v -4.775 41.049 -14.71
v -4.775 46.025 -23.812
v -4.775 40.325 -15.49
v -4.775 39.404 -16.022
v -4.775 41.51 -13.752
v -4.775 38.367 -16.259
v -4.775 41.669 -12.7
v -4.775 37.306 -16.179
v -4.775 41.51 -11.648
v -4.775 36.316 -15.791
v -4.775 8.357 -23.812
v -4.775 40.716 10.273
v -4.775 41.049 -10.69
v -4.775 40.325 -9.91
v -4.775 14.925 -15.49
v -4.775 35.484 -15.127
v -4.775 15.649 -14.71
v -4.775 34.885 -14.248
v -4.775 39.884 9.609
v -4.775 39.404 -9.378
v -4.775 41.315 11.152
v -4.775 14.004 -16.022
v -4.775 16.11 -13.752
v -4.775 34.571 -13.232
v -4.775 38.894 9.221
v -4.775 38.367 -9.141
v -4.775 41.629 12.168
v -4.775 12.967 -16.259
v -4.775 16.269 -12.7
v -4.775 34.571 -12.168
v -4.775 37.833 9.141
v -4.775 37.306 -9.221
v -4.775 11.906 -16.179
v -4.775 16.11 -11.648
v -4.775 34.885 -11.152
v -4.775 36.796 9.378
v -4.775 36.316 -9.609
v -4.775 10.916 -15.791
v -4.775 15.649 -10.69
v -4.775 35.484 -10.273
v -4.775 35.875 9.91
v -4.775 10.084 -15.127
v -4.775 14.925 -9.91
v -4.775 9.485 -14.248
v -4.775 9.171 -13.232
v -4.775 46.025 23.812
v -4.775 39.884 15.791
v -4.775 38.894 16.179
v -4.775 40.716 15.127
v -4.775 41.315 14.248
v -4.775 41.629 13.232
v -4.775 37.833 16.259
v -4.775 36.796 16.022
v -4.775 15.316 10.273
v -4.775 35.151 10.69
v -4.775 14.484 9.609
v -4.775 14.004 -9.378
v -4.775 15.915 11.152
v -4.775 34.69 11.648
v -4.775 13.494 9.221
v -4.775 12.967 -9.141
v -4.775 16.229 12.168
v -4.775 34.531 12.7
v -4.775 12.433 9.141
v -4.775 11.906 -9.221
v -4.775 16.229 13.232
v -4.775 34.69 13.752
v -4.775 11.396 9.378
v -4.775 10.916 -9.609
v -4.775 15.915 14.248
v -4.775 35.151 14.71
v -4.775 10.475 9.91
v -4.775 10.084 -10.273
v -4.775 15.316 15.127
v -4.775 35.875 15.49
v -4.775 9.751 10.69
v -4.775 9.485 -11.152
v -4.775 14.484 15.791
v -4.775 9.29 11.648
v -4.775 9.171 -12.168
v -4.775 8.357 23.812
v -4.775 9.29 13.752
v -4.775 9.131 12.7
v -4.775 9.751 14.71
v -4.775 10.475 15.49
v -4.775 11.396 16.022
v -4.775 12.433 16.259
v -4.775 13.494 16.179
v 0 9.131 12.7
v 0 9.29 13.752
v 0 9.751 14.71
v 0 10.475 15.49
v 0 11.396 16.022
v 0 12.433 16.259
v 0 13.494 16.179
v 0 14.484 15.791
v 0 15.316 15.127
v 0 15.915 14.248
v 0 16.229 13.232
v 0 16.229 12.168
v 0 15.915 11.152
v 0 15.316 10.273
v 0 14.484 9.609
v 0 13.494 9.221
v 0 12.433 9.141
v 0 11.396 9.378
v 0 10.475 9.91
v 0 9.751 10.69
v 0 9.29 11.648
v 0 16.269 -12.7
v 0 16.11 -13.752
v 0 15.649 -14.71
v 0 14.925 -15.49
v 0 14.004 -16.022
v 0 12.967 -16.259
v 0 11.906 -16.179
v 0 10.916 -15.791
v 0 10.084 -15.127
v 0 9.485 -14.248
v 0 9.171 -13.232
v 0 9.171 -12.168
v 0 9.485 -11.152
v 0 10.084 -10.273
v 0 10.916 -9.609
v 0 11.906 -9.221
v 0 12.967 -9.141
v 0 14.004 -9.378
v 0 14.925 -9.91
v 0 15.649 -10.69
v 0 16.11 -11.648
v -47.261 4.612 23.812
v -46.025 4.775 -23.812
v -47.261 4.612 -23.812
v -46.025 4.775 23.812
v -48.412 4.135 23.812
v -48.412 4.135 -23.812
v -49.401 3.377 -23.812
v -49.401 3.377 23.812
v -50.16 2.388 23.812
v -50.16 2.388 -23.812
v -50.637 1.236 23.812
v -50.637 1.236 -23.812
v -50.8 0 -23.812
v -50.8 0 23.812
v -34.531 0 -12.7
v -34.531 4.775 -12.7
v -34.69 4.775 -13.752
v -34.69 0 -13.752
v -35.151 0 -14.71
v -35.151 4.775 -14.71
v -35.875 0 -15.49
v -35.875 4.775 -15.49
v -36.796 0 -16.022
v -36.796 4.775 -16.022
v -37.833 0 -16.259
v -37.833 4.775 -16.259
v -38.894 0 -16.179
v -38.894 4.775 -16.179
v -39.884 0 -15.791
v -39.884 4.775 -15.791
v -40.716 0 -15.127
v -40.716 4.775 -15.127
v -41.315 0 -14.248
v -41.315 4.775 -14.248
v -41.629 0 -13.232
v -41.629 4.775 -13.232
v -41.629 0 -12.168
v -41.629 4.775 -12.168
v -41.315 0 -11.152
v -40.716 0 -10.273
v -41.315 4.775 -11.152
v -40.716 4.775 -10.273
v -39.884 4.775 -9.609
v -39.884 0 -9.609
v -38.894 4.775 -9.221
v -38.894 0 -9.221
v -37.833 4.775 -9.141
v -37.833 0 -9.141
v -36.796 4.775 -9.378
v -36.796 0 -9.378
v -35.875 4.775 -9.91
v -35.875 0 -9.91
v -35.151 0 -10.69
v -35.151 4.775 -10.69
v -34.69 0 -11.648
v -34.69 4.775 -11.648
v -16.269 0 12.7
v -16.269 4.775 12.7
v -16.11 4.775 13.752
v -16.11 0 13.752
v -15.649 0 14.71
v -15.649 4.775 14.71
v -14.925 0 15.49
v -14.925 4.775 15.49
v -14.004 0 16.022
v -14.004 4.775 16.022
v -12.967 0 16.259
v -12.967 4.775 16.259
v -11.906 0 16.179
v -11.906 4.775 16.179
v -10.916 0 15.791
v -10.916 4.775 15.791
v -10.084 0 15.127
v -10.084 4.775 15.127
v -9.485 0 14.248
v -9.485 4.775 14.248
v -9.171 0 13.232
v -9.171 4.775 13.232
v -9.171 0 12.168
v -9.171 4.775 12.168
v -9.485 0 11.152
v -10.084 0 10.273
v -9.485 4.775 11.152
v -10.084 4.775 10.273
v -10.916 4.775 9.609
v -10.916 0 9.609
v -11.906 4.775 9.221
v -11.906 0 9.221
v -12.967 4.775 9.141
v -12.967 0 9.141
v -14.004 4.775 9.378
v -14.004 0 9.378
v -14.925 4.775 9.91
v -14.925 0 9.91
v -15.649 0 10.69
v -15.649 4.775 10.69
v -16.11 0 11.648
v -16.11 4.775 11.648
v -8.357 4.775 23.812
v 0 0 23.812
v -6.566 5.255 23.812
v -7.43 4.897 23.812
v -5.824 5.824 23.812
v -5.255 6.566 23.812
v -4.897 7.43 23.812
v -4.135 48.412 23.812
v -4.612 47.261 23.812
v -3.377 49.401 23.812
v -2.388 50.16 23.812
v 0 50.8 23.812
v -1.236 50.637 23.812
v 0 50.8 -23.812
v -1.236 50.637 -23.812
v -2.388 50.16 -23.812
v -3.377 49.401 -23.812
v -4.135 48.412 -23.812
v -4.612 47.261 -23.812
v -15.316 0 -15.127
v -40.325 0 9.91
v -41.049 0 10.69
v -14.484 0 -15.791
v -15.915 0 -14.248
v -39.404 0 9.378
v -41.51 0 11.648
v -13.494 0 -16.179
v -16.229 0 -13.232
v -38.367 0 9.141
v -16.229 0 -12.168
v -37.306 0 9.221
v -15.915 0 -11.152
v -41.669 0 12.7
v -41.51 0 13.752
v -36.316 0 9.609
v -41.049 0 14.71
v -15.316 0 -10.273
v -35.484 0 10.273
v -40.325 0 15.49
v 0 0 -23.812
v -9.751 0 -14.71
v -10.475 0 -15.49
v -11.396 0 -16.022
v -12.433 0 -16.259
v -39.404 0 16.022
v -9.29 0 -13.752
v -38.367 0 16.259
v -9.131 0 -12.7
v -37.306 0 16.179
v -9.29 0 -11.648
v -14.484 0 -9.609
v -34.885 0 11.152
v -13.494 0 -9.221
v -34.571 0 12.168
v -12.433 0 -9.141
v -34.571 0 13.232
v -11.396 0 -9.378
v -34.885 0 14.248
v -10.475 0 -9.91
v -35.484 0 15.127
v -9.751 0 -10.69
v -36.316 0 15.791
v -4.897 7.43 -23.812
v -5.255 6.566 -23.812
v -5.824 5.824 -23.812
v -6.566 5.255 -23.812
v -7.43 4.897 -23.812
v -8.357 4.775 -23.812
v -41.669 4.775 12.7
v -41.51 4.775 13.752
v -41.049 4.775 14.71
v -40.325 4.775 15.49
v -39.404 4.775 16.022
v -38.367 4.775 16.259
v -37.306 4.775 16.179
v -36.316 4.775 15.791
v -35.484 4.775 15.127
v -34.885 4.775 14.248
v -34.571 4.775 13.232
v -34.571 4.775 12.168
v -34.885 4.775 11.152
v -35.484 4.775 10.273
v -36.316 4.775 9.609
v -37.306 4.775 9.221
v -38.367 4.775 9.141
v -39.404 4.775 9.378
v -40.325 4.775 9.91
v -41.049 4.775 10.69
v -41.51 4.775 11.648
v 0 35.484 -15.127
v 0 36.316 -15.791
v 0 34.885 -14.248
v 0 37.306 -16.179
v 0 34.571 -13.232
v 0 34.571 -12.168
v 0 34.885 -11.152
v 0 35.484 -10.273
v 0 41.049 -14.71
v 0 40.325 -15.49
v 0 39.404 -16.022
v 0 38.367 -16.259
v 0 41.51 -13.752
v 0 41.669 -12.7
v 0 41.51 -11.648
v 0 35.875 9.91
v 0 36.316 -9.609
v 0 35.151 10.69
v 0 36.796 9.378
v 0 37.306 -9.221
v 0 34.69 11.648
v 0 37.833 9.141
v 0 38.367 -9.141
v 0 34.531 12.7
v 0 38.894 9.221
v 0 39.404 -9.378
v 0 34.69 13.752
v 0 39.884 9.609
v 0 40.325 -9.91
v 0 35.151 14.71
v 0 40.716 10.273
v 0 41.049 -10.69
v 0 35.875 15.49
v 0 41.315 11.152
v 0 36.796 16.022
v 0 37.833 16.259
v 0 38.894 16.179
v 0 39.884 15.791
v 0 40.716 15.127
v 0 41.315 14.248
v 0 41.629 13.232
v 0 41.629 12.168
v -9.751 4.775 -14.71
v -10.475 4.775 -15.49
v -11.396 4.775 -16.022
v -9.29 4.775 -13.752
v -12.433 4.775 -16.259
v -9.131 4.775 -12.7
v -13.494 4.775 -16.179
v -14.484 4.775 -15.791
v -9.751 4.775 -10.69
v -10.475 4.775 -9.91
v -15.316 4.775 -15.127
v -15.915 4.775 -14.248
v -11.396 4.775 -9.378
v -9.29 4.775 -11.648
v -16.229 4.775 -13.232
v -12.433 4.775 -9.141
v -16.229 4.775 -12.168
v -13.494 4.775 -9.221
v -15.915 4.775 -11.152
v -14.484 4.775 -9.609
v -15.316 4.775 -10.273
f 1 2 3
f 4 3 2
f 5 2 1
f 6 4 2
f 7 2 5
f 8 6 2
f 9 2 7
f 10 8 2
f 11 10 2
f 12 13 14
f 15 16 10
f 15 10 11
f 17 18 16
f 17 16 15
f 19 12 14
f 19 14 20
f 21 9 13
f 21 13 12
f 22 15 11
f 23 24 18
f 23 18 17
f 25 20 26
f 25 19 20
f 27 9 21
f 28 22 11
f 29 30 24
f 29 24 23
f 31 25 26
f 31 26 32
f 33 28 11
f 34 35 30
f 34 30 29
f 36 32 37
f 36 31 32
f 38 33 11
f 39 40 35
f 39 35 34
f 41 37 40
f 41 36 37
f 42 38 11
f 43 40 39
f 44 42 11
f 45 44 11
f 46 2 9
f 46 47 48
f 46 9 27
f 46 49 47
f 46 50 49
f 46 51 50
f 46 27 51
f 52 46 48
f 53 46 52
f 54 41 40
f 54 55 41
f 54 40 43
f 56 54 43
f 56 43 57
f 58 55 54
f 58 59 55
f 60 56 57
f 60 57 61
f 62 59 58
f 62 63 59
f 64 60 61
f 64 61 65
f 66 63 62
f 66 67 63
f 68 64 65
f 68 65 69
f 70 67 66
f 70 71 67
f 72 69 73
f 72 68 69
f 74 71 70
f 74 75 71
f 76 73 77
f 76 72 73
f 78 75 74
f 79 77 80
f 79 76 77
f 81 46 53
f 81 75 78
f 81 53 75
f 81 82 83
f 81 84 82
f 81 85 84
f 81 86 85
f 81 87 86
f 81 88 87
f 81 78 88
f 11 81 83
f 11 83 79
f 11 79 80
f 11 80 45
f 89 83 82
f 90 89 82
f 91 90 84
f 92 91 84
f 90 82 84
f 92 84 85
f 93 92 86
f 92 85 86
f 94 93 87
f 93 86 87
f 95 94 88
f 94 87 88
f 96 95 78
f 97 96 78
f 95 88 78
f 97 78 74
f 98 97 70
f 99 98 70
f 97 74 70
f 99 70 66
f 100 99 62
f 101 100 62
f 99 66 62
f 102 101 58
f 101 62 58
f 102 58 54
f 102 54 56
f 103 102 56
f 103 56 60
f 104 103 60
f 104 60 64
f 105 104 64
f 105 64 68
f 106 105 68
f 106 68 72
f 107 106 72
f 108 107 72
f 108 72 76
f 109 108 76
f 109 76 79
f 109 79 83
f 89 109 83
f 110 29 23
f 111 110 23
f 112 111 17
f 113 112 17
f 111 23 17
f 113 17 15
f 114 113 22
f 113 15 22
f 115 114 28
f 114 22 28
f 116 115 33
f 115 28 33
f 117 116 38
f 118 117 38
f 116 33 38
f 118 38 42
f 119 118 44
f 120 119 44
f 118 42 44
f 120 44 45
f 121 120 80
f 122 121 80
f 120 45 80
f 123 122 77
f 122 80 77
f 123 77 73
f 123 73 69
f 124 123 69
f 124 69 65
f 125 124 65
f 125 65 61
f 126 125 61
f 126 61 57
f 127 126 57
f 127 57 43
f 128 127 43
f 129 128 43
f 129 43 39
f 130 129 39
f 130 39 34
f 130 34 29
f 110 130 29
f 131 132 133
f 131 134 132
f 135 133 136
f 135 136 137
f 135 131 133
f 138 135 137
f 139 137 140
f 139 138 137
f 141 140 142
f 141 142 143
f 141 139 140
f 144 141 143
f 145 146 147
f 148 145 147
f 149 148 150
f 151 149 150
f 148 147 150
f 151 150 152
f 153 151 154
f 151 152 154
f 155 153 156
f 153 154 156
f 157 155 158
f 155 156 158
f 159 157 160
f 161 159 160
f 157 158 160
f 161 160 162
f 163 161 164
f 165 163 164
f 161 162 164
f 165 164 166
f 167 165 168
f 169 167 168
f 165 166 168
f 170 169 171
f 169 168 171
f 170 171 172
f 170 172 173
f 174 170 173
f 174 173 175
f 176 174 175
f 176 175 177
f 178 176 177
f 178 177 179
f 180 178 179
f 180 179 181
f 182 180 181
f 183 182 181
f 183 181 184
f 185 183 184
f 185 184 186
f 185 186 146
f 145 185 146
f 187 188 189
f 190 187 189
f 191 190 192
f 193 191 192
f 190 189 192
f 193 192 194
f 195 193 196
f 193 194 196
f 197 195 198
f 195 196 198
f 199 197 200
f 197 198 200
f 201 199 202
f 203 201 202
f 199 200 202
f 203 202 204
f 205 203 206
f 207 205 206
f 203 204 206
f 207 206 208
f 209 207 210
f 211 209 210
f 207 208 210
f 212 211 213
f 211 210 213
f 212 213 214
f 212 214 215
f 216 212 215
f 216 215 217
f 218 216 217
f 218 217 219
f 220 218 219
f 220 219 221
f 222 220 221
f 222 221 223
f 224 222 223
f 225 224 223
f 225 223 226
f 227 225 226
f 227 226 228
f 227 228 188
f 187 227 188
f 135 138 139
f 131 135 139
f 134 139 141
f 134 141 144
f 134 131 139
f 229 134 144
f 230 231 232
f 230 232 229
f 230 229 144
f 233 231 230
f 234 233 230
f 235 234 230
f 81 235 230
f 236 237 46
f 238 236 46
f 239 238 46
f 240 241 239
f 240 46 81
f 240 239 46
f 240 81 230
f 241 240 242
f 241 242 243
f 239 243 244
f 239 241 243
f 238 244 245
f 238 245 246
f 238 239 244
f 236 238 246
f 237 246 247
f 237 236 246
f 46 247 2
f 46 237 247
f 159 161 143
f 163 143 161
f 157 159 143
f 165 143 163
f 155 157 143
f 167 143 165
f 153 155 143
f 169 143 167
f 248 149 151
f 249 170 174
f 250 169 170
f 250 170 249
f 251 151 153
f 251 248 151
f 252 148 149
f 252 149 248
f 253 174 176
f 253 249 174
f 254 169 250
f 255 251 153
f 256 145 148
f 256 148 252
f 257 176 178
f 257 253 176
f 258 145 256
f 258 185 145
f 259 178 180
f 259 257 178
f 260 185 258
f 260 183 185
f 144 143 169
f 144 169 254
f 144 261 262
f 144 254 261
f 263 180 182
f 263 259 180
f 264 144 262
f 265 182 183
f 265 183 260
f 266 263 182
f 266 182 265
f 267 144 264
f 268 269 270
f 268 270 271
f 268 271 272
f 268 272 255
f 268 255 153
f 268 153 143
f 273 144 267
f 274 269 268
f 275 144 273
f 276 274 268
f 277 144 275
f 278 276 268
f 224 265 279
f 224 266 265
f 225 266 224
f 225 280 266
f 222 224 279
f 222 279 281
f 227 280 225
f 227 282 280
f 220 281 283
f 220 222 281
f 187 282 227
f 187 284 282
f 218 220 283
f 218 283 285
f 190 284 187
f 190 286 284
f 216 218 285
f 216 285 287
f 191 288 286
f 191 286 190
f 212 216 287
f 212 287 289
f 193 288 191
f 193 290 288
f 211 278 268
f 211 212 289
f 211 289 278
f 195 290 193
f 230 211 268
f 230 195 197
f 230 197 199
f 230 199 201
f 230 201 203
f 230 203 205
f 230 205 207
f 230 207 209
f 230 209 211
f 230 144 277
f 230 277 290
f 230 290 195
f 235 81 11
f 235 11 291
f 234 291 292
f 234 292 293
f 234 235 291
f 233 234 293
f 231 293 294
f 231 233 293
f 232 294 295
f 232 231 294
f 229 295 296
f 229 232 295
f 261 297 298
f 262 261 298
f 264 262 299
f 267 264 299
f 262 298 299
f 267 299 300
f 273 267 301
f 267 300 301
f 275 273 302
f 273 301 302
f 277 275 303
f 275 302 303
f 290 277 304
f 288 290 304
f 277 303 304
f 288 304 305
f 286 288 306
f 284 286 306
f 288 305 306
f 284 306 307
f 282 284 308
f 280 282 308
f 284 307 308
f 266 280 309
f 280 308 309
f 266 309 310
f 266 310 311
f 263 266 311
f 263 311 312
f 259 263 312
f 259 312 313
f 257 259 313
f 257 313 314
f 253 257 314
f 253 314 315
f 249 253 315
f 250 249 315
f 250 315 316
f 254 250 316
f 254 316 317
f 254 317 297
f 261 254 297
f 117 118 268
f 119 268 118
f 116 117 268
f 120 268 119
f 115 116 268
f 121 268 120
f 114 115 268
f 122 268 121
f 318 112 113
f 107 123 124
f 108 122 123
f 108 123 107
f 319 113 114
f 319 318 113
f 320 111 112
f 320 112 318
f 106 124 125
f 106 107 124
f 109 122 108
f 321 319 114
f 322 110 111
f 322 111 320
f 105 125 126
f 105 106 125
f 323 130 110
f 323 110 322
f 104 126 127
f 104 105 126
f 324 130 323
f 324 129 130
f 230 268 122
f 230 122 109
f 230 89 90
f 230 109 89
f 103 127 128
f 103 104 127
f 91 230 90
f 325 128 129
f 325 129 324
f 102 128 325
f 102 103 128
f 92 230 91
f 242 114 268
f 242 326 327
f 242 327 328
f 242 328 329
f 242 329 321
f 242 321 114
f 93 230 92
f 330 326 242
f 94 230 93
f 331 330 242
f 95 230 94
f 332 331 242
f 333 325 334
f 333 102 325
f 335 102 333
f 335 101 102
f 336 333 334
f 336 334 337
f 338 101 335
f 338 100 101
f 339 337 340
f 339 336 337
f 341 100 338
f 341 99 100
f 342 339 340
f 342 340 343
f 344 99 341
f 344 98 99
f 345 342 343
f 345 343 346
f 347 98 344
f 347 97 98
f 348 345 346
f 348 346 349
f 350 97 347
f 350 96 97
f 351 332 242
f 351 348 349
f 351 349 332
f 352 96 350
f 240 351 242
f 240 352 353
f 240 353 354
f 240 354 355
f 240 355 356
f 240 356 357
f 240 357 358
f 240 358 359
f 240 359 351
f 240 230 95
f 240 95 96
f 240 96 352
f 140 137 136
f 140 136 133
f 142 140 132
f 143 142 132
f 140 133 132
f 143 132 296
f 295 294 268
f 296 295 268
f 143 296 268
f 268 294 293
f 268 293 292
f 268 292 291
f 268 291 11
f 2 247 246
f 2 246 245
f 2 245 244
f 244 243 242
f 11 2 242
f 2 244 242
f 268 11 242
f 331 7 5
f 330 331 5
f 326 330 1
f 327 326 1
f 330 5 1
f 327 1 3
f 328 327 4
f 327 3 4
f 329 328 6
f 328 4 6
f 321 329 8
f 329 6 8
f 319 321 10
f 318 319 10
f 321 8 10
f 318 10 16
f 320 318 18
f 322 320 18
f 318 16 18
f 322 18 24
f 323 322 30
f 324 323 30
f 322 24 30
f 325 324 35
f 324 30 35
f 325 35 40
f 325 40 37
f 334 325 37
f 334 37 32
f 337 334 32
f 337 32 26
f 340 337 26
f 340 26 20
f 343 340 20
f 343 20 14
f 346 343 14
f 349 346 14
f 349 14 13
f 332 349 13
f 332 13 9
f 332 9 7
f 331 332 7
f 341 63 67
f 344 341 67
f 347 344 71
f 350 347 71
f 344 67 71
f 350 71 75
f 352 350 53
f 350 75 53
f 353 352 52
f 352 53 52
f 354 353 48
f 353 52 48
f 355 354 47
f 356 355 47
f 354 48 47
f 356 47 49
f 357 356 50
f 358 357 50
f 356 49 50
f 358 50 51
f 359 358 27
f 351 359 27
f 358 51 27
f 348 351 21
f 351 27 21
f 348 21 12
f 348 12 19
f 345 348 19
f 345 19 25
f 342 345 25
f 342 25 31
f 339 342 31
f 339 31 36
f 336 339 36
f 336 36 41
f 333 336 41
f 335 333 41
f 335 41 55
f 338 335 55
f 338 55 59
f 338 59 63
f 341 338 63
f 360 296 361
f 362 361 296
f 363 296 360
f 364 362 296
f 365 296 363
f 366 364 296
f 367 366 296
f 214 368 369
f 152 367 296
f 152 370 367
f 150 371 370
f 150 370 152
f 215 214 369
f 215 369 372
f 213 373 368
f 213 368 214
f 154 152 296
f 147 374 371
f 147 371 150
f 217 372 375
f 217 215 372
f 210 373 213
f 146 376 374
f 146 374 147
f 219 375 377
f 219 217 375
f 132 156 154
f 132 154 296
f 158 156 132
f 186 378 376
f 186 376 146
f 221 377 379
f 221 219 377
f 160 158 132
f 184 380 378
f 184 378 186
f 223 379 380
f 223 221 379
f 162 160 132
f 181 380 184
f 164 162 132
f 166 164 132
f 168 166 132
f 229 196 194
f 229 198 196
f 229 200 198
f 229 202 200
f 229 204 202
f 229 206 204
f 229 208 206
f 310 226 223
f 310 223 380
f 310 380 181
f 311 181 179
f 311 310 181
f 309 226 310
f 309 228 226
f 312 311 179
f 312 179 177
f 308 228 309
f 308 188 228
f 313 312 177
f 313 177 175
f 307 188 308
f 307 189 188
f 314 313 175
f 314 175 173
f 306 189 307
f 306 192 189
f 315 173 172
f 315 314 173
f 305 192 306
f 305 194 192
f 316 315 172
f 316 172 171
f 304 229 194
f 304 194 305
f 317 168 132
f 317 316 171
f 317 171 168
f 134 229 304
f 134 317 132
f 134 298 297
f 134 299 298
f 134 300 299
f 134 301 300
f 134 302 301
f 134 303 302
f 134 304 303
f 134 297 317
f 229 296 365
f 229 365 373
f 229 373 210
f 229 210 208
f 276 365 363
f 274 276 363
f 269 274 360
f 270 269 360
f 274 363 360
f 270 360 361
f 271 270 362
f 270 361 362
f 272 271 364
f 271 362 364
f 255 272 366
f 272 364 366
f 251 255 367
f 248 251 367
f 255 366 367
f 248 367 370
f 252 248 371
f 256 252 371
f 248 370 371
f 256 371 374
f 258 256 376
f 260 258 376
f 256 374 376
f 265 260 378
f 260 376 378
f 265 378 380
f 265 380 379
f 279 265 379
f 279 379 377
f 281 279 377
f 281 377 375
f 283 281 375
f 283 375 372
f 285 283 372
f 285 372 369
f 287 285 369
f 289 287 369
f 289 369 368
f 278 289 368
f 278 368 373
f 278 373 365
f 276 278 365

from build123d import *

# Parameters (mm, degrees)
EXTRUDE1_DEPTH     = 23.8125
SKETCH8_R          = 3.5687
CUT_EXTRUDE7_DEPTH = 73.566916507
SKETCH9_R          = 3.5687
CUT_EXTRUDE8_DEPTH = 73.566916507


with BuildPart() as part:
    # Sketch1 → Extrude1 (new, symmetric)
    with BuildSketch(Plane.XY):
        with BuildLine():
            Line((0, 0), (0, 50.8))
            ThreePointArc((0, 50.8), (-3.376576302, 49.401376302), (-4.7752, 46.0248))
            Line((-4.7752, 46.0248), (-4.7752, 8.3566))
            ThreePointArc((-4.7752, 8.3566), (-5.824167774, 5.824167774), (-8.3566, 4.7752))
            Line((-8.3566, 4.7752), (-46.0248, 4.7752))
            ThreePointArc((-46.0248, 4.7752), (-49.401376302, 3.376576302), (-50.8, 0))
            Line((-50.8, 0), (0, 0))
        make_face()
    extrude(amount=EXTRUDE1_DEPTH, both=True)

    # Sketch8 → Cut-Extrude7 (cut, through all)
    with BuildSketch(Plane(origin=(0, 4.7752, 0), x_dir=(1, 0, 0), z_dir=(0, 1, 0))):
        with Locations(Location((-38.1, -12.7, 0), (0, 0, 180))):
            Circle(SKETCH8_R)
        with Locations(Location((-12.7, -12.7, 0), (0, 0, 180))):
            Circle(SKETCH8_R)
        with Locations((-12.7, 12.7)):
            Circle(SKETCH8_R)
        with Locations((-38.1, 12.7)):
            Circle(SKETCH8_R)
    extrude(amount=-CUT_EXTRUDE7_DEPTH, mode=Mode.SUBTRACT)

    # Sketch9 → Cut-Extrude8 (cut, through all)
    with BuildSketch(Plane.ZY.offset(4.7752)):
        with Locations(Location((12.7, 12.7, 0), (0, 0, 270))):
            Circle(SKETCH9_R)
        with Locations(Location((12.7, 38.1, 0), (0, 0, 270))):
            Circle(SKETCH9_R)
        with Locations(Location((-12.7, 12.7, 0), (0, 0, 90))):
            Circle(SKETCH9_R)
        with Locations(Location((-12.7, 38.1, 0), (0, 0, 90))):
            Circle(SKETCH9_R)
    extrude(amount=-CUT_EXTRUDE8_DEPTH, mode=Mode.SUBTRACT)


solid = part.part
